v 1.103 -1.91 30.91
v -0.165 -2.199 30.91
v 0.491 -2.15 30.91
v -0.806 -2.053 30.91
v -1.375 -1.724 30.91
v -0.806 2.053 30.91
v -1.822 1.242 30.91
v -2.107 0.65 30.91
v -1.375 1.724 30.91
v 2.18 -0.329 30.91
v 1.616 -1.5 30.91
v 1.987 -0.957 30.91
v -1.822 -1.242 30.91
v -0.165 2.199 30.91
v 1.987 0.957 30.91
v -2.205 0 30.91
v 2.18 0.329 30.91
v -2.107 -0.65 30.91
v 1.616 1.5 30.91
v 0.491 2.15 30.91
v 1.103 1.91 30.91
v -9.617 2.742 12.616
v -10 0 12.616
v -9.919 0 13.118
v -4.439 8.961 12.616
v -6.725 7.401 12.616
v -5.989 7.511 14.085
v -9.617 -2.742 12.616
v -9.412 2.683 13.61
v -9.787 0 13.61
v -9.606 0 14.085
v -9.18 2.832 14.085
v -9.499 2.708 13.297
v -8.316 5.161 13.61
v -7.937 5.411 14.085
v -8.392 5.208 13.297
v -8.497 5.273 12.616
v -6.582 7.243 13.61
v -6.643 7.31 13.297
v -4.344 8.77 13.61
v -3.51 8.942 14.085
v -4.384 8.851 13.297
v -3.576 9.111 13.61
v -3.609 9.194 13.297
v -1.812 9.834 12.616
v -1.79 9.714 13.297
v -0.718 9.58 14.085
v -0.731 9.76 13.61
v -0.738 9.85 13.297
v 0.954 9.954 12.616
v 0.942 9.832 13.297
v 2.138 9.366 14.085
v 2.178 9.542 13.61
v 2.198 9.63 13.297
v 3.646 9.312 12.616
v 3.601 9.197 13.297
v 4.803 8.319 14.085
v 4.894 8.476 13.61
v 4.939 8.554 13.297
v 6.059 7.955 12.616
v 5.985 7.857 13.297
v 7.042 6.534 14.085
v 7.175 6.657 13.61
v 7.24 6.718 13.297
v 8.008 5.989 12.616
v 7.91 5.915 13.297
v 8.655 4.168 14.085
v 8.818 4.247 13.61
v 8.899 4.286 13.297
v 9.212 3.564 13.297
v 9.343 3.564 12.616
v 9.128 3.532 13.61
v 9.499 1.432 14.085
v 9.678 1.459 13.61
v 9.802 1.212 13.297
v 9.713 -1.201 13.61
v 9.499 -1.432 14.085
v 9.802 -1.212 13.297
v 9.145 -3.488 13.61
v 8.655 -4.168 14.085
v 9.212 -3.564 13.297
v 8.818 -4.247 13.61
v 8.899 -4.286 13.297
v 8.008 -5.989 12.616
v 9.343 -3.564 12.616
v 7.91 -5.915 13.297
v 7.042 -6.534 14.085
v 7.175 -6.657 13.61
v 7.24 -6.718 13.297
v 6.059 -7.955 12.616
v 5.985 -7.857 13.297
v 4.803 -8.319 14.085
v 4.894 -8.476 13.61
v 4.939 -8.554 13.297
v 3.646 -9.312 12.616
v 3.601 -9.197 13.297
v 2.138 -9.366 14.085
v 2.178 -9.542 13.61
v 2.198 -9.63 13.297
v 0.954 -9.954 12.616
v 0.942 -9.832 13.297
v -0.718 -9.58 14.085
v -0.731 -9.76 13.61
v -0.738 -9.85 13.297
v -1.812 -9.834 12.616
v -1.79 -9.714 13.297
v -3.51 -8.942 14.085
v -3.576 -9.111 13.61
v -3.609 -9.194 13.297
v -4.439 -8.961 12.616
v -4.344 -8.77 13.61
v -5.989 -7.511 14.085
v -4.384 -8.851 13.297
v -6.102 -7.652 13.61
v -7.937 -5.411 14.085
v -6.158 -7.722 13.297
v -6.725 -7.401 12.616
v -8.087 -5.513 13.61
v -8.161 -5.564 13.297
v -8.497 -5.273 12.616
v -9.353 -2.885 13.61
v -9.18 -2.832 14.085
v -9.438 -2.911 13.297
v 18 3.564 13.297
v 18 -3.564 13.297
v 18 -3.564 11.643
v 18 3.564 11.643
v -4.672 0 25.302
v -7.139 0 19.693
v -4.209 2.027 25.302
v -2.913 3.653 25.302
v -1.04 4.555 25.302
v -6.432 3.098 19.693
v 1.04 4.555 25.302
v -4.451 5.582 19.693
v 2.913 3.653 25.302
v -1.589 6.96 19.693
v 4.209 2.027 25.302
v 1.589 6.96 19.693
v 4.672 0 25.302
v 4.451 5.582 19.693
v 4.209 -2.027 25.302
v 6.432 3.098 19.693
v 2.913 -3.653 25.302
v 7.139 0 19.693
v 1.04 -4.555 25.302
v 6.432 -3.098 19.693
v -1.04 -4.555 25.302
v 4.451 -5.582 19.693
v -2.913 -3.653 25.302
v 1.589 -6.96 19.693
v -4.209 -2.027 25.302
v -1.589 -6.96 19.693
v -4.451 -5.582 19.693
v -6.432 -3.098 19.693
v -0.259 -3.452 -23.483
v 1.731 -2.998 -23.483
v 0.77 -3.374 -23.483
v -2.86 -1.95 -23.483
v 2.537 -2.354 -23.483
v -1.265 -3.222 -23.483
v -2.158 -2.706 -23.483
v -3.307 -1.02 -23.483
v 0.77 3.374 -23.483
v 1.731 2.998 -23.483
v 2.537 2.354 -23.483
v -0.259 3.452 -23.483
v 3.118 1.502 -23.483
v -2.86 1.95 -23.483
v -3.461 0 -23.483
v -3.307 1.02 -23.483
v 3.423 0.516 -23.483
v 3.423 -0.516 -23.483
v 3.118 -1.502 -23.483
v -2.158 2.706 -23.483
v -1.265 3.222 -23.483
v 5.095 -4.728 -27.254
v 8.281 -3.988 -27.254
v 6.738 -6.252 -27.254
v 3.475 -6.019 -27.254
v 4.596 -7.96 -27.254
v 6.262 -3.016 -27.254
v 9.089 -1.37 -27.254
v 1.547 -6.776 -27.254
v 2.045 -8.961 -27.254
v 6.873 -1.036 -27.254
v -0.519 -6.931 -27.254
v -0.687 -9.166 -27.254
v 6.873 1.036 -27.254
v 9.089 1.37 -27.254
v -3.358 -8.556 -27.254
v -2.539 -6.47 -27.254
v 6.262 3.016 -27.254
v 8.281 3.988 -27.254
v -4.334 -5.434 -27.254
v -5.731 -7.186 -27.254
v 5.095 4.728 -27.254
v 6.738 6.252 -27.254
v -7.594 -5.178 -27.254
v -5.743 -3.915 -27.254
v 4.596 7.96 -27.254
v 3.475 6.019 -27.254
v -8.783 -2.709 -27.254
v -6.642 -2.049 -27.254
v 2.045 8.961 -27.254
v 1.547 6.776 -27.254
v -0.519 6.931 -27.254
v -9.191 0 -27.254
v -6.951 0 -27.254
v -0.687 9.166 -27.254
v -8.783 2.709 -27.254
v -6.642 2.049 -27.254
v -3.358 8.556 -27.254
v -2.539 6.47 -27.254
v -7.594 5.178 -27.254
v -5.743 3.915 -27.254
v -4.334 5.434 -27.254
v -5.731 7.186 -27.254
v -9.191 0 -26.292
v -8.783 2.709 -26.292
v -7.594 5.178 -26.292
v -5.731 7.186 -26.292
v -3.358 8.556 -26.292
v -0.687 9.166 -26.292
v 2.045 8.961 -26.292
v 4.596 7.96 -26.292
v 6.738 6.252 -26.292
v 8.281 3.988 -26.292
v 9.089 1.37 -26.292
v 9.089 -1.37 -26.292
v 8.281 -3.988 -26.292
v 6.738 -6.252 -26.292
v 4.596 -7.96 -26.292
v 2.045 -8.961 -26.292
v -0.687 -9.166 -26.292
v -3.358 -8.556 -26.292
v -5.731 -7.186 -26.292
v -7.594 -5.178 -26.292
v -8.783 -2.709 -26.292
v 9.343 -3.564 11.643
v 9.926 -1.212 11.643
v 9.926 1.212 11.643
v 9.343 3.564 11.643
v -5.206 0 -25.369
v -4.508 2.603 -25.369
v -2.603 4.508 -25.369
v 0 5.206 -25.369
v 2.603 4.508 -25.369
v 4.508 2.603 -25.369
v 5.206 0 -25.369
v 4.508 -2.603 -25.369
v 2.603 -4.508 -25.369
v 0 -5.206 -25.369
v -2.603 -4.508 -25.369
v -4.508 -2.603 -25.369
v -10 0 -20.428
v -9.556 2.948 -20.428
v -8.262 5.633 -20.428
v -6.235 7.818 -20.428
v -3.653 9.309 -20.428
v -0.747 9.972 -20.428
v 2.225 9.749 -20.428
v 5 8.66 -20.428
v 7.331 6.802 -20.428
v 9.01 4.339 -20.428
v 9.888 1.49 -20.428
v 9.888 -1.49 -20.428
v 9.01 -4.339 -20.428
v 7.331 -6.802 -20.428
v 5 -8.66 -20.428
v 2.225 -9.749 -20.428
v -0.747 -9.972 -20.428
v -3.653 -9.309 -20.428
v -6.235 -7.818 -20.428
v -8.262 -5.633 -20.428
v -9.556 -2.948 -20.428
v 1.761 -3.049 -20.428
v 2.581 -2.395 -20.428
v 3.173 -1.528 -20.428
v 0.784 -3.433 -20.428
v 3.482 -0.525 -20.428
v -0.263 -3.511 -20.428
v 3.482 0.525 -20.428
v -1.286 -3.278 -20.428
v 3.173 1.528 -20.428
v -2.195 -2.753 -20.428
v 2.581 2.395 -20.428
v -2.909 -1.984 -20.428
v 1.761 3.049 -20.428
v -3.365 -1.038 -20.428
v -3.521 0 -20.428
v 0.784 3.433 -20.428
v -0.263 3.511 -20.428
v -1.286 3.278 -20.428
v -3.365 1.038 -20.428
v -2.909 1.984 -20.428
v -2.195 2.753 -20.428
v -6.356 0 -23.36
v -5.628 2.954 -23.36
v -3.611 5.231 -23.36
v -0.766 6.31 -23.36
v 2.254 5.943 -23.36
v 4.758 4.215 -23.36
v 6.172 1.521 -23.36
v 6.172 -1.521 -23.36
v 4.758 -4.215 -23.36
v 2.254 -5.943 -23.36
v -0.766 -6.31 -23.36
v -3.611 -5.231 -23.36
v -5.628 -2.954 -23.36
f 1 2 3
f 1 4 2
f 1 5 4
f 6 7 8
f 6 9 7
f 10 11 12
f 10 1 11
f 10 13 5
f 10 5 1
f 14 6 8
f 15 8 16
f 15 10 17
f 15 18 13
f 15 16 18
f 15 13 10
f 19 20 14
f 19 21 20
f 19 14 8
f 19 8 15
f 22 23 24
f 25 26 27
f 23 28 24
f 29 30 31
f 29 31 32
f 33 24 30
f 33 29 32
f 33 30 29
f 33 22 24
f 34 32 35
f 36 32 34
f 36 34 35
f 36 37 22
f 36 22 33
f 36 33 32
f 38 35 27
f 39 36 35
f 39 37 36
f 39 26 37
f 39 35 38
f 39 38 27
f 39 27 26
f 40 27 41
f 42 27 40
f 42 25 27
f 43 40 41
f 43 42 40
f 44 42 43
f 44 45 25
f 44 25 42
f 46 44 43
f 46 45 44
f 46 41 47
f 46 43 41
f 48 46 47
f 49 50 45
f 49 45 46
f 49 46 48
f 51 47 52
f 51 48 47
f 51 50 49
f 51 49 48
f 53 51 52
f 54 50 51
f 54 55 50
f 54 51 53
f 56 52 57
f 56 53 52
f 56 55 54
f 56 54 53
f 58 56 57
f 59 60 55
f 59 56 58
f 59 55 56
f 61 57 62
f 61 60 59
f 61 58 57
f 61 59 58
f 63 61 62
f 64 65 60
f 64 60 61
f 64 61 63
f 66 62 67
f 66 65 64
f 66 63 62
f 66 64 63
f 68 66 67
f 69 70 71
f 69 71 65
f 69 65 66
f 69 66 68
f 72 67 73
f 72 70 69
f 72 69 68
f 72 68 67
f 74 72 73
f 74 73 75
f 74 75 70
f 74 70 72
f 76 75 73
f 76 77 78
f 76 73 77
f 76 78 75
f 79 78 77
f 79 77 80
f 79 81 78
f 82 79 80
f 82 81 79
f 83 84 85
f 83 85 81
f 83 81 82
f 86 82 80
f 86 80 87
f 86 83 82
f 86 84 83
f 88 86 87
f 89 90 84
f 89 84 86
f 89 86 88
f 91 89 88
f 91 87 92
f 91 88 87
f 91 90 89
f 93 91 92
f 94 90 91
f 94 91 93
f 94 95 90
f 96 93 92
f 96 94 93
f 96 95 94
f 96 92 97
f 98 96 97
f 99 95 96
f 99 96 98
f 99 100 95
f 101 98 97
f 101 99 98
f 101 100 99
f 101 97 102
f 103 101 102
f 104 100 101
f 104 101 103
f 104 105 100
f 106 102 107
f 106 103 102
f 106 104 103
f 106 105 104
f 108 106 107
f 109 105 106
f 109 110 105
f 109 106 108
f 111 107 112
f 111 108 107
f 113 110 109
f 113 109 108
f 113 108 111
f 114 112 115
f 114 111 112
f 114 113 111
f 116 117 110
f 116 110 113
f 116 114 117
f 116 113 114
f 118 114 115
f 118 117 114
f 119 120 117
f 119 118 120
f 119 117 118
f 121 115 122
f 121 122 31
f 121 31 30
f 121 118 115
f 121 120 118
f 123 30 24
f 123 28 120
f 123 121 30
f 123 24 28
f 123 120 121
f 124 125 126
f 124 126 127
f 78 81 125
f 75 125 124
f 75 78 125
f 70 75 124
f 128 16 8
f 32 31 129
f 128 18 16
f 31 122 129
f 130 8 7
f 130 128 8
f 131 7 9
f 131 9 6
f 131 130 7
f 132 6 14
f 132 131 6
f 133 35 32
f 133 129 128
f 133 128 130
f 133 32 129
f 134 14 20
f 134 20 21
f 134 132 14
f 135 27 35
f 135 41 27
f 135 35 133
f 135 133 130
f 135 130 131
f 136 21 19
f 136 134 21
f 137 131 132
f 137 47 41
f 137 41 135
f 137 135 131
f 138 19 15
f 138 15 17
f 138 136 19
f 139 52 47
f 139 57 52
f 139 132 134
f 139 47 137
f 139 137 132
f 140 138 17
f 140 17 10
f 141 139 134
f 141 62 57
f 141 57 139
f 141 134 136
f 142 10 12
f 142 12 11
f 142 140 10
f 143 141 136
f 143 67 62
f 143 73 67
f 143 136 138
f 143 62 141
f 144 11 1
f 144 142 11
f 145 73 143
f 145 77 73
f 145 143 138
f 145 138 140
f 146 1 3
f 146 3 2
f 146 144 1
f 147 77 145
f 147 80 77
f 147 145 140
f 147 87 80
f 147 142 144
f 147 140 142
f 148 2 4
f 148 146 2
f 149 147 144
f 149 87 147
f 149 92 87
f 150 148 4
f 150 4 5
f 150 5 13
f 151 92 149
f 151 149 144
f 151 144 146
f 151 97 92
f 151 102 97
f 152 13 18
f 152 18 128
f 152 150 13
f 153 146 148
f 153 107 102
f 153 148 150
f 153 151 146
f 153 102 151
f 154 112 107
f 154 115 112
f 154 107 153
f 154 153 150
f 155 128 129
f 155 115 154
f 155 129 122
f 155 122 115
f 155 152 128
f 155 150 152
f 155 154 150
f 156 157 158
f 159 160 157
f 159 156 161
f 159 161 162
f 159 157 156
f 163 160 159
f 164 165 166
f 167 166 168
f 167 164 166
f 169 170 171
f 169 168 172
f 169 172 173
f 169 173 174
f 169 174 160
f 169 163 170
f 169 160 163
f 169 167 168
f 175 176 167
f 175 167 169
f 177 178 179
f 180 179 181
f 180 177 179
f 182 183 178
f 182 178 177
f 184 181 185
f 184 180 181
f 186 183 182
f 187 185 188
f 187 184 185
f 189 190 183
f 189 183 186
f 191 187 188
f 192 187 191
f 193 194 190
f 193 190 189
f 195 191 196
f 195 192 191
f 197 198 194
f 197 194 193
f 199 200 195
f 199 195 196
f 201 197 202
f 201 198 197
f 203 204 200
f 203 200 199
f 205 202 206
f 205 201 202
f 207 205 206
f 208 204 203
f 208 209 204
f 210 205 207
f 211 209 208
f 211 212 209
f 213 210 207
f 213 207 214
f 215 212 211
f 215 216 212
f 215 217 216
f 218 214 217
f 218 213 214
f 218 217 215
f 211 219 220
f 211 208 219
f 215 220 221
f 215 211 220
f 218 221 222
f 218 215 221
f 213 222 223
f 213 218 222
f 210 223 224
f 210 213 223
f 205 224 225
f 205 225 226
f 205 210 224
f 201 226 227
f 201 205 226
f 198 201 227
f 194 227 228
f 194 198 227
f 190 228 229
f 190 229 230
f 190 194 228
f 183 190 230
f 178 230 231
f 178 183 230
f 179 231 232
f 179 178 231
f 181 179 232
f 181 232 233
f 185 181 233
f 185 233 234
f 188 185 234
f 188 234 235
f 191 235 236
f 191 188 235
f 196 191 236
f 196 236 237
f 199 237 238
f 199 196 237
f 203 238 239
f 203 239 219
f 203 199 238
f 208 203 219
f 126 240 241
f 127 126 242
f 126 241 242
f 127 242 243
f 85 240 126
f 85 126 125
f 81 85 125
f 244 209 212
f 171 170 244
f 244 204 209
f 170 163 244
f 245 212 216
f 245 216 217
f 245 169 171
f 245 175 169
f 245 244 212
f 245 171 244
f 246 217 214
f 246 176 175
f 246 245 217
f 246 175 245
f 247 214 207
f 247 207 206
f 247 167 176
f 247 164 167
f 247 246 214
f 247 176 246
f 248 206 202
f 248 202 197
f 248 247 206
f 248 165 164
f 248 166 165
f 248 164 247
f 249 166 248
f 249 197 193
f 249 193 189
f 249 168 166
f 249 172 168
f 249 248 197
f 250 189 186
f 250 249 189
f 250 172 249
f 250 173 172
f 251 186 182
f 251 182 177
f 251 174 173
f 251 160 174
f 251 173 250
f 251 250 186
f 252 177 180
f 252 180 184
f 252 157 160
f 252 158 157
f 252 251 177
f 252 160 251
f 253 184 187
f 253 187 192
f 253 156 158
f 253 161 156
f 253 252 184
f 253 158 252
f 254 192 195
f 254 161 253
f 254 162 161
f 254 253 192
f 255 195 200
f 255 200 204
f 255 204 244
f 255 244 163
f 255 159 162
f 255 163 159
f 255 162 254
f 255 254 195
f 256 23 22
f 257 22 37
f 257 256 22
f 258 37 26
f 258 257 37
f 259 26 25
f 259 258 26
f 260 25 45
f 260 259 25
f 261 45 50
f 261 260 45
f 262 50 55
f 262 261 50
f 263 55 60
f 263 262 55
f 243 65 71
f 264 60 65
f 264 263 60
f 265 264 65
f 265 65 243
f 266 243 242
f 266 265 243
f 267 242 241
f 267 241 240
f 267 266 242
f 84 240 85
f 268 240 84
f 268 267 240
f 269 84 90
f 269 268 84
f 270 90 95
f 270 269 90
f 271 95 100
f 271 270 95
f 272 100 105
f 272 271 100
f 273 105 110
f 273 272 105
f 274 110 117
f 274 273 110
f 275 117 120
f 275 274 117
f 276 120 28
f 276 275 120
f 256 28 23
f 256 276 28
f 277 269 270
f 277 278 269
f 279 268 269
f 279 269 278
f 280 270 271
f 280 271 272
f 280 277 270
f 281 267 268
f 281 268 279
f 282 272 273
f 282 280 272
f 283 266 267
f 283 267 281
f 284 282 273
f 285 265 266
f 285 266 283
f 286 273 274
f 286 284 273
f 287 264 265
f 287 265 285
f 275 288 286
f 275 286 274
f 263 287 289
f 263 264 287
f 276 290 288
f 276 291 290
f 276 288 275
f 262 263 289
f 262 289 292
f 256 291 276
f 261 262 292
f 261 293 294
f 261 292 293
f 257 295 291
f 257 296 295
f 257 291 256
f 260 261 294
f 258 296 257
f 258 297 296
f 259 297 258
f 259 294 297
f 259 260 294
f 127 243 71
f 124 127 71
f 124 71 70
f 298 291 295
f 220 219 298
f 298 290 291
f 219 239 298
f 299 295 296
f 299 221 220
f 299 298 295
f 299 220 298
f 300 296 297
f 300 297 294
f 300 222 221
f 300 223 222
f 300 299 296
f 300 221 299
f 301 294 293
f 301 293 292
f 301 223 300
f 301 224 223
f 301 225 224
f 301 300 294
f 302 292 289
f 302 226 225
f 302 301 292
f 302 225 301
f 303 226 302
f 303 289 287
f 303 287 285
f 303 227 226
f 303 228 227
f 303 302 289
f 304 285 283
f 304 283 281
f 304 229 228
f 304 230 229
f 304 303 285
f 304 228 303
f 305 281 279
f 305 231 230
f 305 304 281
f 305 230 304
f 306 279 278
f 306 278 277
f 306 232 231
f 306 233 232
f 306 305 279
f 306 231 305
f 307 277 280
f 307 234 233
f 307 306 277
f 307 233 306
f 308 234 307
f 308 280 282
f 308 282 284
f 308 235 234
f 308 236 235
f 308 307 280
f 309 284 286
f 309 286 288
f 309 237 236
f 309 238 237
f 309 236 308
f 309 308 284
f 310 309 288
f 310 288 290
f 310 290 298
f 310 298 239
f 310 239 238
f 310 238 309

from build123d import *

# Parameters (mm, degrees)
F2_W     = 7.128102
F2_H     = 1.654645
F3_DEPTH = 18


with BuildPart() as f1:
    # F0 (on Front) → F1 (revolve)
    with BuildSketch(Plane.XZ):
        with BuildLine():
            Line((0, 30.909854), (-2.205052, 30.909854))
            Line((-2.205052, 30.909854), (-9.606381, 14.085311))
            ThreePointArc((-9.606381, 14.085311), (-9.859412, 13.365584), (-10, 12.615739))
            Line((-10, 12.615739), (-10, -20.428332))
            Line((-10, -20.428332), (-3.521215, -20.428332))
            Line((-3.521215, -20.428332), (-9.191453, -26.291605))
            Line((-9.191453, -26.291605), (-9.191453, -27.253969))
            Line((-9.191453, -27.253969), (-6.950572, -27.253969))
            Line((-6.950572, -27.253969), (-3.461232, -23.483038))
            Line((-3.461232, -23.483038), (0, -23.483038))
            Line((0, -23.483038), (0, 30.909854))
        make_face()
    revolve(axis=Axis((0, 0, 3.713408), (0, 0, -1)))

    # F2 (on Right) → F3 (join)
    with BuildSketch(Plane.YZ):
        with Locations((0, 12.470122)):
            Rectangle(F2_W, F2_H)
    extrude(amount=F3_DEPTH)


solid = f1.part
